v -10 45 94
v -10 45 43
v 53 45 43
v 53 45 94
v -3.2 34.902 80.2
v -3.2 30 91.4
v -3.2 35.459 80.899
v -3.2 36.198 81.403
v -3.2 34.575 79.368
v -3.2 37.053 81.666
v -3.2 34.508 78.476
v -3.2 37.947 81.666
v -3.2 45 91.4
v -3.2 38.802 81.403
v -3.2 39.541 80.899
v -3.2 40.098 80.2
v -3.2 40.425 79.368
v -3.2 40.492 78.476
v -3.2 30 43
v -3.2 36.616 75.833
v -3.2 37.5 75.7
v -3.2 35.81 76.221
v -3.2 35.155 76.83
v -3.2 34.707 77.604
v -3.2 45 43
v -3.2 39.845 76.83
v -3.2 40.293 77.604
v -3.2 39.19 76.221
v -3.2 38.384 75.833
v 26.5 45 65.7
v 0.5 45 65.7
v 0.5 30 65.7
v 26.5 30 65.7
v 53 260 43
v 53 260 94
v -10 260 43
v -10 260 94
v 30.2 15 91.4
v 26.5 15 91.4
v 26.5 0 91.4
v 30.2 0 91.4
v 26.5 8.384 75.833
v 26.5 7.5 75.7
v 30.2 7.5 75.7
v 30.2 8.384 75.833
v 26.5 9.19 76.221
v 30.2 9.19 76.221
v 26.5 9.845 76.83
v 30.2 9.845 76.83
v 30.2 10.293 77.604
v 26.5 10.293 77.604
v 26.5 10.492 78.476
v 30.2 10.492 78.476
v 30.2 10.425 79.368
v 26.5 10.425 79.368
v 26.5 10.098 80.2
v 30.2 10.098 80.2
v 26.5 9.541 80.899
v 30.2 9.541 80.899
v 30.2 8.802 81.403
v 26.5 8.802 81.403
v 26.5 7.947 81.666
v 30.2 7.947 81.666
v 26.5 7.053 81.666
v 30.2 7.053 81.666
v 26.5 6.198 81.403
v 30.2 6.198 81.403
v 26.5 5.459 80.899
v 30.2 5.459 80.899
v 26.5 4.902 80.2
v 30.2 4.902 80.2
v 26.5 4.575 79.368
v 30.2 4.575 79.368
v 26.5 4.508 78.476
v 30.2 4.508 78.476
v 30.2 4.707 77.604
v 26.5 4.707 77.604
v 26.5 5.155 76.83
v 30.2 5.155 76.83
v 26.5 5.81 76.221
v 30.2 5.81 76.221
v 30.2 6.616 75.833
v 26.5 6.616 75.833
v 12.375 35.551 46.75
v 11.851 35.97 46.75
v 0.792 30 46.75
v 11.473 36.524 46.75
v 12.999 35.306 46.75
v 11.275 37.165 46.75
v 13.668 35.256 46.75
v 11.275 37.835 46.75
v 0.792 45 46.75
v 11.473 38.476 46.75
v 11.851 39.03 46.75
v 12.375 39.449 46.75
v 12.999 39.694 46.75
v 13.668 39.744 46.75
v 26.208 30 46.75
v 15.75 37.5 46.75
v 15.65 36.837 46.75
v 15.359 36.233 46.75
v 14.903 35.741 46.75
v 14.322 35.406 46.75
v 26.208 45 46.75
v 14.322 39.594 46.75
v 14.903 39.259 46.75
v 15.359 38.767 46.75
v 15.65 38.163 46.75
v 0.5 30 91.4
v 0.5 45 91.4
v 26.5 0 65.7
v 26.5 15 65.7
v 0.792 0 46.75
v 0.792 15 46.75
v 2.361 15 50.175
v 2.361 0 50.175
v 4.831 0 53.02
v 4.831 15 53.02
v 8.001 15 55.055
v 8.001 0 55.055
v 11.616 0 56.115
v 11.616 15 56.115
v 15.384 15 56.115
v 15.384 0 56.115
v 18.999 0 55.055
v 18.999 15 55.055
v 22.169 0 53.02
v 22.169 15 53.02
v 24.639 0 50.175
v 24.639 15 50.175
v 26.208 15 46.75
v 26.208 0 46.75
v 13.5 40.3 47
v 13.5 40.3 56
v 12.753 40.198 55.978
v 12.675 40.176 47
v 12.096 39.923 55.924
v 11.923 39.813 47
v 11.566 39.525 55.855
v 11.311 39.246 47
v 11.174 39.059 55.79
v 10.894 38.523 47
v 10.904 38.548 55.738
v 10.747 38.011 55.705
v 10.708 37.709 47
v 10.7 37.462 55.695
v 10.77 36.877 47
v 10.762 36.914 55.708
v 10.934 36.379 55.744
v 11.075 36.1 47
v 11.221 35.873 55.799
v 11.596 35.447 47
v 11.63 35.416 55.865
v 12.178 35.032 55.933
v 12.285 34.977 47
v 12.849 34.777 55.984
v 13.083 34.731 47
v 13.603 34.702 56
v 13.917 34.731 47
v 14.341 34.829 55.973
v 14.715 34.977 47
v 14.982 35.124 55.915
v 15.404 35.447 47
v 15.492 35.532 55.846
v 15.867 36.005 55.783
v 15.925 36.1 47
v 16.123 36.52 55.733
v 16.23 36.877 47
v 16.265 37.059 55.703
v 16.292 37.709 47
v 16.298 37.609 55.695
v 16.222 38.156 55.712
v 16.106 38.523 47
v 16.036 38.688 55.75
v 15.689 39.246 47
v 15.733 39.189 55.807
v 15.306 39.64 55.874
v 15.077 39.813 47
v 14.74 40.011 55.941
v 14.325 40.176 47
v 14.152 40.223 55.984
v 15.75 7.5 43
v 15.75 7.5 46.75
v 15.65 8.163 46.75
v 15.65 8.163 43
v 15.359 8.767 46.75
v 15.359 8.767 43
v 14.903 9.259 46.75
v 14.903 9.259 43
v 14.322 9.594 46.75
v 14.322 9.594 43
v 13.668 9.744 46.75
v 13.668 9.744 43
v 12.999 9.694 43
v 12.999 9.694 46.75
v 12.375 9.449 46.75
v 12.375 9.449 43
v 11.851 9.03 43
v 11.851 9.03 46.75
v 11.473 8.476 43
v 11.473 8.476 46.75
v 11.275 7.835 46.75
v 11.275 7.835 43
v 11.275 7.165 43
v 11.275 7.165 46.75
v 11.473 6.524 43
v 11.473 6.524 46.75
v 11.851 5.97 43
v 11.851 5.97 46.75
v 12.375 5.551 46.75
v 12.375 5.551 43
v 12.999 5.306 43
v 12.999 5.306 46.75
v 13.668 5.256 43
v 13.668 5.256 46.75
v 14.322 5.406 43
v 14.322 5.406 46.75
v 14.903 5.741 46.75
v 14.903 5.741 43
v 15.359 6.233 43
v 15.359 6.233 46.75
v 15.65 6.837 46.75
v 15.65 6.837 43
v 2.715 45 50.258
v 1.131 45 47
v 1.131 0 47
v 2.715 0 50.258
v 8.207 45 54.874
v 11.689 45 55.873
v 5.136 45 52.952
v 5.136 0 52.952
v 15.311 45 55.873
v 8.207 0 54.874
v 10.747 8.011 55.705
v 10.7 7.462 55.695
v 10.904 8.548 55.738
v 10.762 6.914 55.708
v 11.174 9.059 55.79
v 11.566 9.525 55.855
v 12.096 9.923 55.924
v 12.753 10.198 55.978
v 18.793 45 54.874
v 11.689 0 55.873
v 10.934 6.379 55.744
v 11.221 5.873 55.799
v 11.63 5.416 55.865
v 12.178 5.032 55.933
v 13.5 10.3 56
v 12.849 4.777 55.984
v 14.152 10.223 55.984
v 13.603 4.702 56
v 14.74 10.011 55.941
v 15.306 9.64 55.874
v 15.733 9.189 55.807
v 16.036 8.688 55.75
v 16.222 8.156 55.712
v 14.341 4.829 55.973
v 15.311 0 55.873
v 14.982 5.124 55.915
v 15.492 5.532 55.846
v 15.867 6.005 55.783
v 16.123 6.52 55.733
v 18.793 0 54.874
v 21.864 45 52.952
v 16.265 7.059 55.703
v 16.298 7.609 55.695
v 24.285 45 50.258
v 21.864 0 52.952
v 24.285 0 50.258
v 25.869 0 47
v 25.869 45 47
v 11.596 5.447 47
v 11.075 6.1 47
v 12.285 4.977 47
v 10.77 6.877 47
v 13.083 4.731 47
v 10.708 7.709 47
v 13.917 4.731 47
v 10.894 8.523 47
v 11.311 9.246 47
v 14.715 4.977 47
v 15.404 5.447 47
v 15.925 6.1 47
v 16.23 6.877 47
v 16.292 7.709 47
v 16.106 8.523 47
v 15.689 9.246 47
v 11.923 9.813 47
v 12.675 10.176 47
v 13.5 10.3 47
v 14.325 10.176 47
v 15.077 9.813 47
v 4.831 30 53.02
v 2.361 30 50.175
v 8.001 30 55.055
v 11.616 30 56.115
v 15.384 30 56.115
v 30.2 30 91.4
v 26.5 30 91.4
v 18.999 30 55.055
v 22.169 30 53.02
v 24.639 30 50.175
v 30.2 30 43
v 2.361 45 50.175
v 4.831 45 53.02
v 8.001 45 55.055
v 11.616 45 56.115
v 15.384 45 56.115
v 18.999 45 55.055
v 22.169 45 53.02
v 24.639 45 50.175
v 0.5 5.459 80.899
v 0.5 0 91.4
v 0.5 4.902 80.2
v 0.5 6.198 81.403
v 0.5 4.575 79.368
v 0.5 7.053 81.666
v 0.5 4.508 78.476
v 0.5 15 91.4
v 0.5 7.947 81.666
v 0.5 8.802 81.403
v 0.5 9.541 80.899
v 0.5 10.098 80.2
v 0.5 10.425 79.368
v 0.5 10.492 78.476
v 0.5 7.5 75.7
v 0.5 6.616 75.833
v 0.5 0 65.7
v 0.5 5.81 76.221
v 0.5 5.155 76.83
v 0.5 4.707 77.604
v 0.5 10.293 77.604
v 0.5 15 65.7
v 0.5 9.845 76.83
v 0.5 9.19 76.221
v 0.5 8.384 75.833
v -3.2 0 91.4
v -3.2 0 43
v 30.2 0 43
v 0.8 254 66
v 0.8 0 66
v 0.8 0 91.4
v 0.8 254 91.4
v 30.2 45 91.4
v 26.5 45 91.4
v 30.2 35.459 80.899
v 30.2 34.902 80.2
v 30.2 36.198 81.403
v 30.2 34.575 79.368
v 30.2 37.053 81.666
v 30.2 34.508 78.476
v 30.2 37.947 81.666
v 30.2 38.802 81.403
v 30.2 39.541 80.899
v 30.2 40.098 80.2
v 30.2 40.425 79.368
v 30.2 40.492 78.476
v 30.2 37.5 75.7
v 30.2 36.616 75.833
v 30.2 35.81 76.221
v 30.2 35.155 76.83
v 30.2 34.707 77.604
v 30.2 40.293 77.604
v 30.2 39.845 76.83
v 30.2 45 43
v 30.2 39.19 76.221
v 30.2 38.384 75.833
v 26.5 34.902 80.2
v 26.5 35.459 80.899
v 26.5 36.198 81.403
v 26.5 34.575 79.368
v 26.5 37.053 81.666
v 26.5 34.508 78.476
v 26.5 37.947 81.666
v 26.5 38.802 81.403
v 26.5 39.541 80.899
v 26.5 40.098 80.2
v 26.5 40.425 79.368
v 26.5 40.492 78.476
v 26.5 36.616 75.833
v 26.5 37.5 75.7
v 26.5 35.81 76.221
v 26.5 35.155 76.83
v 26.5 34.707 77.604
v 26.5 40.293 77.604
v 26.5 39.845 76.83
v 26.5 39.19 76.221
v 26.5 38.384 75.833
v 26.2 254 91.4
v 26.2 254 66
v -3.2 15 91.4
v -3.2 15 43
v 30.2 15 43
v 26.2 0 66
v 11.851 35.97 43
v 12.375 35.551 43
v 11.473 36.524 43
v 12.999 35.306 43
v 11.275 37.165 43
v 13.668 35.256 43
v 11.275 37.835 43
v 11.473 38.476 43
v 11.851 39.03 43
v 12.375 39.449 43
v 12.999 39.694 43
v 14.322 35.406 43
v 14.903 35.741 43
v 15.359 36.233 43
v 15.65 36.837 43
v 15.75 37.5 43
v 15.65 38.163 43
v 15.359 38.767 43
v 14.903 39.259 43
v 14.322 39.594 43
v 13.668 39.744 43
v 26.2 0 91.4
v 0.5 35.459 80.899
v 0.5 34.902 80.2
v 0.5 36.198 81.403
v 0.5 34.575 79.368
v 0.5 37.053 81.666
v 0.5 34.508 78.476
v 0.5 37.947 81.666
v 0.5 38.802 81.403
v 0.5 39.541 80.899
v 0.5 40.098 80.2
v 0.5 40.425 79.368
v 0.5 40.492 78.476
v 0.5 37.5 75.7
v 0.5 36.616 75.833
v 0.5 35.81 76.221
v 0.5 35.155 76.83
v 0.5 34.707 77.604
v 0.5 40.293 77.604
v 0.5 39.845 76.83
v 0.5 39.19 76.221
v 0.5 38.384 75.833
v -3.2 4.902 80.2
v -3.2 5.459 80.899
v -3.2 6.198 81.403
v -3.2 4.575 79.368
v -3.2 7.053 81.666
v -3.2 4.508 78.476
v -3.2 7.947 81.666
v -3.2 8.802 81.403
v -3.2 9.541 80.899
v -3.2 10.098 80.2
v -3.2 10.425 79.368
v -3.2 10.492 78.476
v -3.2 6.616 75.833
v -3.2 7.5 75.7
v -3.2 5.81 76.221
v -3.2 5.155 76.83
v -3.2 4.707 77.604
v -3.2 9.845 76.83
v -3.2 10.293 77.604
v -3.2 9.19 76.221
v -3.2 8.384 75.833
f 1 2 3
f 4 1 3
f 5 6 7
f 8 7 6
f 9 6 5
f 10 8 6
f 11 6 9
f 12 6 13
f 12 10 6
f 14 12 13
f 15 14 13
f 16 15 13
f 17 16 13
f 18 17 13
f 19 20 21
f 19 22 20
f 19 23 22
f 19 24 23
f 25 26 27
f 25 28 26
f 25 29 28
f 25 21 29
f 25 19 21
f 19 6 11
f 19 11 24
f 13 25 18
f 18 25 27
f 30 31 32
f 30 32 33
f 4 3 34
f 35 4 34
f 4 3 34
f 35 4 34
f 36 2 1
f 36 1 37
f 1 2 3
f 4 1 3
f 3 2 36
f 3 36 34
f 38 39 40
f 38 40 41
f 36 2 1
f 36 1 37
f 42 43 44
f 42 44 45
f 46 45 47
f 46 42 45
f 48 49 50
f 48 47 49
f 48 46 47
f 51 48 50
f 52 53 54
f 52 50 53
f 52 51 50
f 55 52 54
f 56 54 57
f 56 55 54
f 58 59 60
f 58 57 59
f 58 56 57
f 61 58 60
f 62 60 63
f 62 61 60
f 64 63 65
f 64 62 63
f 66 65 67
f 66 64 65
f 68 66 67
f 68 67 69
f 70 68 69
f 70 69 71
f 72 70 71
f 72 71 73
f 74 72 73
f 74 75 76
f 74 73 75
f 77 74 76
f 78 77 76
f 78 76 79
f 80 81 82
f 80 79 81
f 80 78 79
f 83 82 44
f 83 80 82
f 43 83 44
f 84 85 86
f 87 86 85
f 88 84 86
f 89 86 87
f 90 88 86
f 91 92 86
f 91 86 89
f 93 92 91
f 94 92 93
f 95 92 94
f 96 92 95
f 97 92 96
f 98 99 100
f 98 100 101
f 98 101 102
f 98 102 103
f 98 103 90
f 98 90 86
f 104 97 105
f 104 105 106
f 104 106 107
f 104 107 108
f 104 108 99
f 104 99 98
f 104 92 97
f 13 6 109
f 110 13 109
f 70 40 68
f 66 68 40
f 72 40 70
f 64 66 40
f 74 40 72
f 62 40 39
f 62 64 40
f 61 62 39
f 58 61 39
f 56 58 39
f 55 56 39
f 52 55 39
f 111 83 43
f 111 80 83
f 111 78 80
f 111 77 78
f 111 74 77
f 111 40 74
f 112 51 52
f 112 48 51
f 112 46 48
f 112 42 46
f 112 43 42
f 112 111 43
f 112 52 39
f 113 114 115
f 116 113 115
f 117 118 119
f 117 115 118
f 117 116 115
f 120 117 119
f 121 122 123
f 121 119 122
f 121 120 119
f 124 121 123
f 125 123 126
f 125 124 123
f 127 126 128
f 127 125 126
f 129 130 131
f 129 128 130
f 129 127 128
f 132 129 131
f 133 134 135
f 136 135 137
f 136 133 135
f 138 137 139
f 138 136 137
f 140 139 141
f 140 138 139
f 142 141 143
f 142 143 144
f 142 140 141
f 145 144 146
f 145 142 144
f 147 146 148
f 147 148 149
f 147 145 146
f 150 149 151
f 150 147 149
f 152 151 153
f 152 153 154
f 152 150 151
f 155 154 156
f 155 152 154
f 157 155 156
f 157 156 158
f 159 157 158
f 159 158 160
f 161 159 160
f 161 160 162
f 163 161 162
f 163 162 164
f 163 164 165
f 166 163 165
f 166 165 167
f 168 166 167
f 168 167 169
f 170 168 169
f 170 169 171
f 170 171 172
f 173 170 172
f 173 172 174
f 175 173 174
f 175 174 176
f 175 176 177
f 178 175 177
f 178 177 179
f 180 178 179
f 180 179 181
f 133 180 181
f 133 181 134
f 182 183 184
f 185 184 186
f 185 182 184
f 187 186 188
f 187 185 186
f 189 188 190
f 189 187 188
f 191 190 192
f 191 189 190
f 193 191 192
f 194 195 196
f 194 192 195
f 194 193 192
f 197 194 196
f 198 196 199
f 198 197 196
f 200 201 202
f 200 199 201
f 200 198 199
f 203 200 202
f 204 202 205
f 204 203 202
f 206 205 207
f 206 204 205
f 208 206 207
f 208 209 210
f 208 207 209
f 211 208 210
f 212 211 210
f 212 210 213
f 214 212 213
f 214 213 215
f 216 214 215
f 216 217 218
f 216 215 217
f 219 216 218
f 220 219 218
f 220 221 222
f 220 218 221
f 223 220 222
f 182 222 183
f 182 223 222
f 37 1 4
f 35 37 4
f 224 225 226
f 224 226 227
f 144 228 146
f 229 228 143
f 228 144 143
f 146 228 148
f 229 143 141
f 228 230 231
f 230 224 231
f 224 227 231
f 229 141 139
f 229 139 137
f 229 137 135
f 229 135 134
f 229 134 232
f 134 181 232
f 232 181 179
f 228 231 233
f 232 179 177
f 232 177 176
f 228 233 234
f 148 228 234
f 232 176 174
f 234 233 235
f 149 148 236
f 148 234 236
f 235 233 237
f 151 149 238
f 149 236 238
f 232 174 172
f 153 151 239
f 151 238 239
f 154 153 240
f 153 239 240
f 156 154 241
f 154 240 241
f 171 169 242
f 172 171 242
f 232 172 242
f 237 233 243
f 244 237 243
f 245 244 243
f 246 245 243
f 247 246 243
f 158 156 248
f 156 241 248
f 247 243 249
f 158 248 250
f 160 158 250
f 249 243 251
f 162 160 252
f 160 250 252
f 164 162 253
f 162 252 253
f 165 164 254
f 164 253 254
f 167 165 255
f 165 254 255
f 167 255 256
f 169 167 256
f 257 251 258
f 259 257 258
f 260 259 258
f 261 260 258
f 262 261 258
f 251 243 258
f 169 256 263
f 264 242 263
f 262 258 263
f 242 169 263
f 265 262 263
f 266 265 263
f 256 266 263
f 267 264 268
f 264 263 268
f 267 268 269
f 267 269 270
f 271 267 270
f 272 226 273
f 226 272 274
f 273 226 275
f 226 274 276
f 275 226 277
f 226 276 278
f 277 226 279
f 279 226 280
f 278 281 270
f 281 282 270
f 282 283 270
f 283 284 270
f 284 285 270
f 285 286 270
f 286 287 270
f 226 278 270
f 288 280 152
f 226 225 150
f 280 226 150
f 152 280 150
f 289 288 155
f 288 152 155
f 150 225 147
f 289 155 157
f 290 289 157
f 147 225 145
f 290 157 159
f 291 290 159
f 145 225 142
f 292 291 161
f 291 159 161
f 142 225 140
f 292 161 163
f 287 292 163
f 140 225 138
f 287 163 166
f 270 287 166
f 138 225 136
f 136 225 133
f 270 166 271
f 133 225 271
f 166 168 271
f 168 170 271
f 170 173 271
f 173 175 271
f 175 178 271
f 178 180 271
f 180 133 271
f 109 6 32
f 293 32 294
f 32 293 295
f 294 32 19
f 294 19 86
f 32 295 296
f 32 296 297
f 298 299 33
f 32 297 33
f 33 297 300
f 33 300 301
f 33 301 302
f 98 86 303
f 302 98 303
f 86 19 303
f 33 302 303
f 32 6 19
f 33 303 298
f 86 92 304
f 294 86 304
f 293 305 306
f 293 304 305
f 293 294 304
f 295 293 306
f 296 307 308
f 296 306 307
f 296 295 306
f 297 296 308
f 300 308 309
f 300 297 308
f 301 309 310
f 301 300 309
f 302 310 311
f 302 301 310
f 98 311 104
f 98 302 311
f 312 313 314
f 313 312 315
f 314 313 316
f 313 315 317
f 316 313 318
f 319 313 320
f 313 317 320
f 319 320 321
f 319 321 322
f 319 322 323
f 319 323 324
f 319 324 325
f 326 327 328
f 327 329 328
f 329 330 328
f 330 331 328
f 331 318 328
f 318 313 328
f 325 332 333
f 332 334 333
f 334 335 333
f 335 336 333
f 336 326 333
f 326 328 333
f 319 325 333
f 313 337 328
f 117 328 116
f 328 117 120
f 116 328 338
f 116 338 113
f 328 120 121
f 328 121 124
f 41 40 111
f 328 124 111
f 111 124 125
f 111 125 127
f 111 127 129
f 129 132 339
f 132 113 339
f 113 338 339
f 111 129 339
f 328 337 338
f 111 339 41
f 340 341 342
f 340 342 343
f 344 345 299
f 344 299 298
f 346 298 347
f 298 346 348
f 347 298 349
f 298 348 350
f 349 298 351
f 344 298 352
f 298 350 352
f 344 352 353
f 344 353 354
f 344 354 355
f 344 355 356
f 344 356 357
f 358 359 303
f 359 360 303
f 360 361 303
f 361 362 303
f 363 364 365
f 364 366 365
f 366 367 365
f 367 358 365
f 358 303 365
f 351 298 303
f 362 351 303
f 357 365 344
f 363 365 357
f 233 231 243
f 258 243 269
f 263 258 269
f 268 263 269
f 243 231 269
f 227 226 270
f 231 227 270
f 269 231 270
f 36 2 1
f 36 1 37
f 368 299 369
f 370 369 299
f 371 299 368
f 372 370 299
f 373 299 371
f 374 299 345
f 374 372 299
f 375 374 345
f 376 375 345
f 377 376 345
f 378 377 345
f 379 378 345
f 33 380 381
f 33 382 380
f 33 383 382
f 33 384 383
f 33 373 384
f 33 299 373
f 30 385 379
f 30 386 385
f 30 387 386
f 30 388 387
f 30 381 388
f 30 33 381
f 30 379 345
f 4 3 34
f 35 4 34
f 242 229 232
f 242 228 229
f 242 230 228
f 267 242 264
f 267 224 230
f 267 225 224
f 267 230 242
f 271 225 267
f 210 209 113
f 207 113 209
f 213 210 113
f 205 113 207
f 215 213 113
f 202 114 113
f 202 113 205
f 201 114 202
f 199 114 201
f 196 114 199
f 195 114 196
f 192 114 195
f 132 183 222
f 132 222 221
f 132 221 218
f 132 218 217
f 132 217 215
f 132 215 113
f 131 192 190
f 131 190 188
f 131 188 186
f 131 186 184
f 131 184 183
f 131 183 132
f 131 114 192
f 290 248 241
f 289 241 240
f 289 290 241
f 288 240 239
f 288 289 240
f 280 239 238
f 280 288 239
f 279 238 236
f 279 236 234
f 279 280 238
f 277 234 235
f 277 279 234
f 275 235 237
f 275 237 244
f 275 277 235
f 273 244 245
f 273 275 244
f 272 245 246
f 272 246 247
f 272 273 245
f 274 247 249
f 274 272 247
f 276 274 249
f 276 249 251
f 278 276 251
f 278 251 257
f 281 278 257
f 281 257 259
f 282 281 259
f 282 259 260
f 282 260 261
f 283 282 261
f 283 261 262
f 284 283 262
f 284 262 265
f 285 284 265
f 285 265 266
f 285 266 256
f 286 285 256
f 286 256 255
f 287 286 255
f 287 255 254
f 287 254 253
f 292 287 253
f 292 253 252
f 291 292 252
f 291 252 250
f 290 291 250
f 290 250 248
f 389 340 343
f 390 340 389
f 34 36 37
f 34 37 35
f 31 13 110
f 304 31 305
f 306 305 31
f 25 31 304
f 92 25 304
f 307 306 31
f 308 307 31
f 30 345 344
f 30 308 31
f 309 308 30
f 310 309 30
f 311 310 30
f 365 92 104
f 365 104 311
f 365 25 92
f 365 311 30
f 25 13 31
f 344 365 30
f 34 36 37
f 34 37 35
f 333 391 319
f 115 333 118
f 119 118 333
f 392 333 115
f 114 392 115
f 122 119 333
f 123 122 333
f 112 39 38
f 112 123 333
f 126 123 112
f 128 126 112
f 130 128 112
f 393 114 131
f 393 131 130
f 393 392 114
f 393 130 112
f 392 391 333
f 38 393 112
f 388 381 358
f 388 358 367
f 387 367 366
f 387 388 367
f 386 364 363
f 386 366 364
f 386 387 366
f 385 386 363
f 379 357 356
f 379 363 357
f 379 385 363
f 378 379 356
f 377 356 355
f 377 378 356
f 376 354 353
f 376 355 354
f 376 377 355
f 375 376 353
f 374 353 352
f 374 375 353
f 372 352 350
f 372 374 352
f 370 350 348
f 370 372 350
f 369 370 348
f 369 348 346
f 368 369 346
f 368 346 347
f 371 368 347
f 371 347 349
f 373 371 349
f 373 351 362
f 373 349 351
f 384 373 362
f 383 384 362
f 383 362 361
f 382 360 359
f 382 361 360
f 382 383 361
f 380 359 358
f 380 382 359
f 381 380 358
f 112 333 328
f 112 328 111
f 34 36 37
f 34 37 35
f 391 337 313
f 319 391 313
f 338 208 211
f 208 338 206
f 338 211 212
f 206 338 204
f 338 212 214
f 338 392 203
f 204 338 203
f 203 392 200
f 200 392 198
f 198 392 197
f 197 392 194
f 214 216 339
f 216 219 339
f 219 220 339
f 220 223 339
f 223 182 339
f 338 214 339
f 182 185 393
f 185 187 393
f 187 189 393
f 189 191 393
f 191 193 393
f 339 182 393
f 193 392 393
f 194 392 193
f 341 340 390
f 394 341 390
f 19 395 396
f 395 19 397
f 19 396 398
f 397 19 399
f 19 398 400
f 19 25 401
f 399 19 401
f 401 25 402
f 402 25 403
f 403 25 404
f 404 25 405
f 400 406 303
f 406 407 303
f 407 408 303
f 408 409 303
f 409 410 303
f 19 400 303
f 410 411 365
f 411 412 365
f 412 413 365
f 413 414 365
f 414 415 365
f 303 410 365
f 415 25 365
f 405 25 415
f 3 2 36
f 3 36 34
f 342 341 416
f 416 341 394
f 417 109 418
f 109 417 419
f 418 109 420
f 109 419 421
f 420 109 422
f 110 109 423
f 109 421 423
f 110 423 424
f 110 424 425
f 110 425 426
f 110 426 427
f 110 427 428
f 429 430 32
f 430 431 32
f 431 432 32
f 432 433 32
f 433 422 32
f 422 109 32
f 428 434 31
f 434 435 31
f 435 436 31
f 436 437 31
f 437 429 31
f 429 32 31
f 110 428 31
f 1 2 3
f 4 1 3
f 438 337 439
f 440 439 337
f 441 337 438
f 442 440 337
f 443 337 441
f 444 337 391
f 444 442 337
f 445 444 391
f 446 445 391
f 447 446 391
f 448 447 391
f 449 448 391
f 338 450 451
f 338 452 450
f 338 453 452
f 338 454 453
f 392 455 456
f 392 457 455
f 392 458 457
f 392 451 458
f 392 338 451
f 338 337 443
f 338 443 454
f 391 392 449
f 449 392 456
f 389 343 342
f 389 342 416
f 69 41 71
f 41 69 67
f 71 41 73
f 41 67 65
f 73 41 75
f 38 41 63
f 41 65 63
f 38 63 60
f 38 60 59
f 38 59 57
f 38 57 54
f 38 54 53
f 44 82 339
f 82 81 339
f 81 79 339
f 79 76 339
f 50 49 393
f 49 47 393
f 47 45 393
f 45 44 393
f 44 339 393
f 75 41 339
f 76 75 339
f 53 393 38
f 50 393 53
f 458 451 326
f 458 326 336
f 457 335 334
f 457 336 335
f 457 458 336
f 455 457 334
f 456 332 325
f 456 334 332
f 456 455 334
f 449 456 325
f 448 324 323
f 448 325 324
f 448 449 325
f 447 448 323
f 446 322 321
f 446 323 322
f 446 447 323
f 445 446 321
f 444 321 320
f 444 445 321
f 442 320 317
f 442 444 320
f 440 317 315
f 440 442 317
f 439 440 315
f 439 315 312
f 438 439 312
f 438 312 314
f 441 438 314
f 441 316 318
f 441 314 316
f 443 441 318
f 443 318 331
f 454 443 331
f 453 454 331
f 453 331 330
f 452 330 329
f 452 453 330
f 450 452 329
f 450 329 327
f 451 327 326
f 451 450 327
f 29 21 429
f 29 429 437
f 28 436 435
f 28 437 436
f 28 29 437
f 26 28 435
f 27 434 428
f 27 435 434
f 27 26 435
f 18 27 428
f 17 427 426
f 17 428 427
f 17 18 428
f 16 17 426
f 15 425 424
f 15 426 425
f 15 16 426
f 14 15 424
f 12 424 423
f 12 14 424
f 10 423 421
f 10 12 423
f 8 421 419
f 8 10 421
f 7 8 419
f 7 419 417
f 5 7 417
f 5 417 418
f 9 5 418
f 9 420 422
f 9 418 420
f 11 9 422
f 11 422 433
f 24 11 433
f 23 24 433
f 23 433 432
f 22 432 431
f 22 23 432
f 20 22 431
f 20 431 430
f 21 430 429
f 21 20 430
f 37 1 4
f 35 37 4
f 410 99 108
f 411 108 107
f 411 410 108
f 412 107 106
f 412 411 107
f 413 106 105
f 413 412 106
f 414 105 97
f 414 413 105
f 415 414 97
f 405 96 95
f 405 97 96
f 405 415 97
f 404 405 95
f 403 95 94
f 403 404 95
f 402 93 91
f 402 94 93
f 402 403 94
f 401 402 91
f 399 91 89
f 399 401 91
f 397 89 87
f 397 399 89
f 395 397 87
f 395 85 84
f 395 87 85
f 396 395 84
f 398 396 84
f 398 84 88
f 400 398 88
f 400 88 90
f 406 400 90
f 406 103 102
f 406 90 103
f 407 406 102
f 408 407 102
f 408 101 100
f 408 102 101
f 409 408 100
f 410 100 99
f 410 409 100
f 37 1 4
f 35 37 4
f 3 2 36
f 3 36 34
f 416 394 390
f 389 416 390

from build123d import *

# Parameters (mm, degrees)
BOX013_W          = 25.4
BOX013_H          = 254
BOX013_DEPTH      = 25.4
BOX017_W          = 63
BOX017_H          = 215
BOX017_DEPTH      = 51
BOX021_W          = 63
BOX021_H          = 215
BOX021_DEPTH      = 51
BOX022_W          = 63
BOX022_H          = 215
BOX022_DEPTH      = 51
CYLINDER011_R     = 2.8
CYLINDER011_DEPTH = 10
CYLINDER012_R     = 2.8
CYLINDER012_DEPTH = 10
BOX020_W          = 63
BOX020_H          = 215
BOX020_DEPTH      = 51
BOX012_W          = 27
BOX012_H          = 200
BOX012_DEPTH      = 20
CYLINDER_R        = 13
CYLINDER_DEPTH    = 120
CYLINDER014_R     = 2.25
CYLINDER014_DEPTH = 10
CYLINDER008_R     = 3
CYLINDER008_DEPTH = 100
BOX023_W          = 27
BOX023_H          = 200
BOX023_DEPTH      = 20
CYLINDER013_R     = 13.25
CYLINDER013_DEPTH = 120
BOX_W             = 26
BOX_H             = 254
BOX_DEPTH         = 26
BOX014_W          = 33.4
BOX014_H          = 15
BOX014_DEPTH      = 48.4
CYLINDER015_R     = 2.25
CYLINDER015_DEPTH = 10
CYLINDER009_R     = 3
CYLINDER009_DEPTH = 100
BOX016_W          = 27
BOX016_H          = 200
BOX016_DEPTH      = 20
CYLINDER010_R     = 13.25
CYLINDER010_DEPTH = 120
BOX018_W          = 26
BOX018_H          = 254
BOX018_DEPTH      = 26
BOX015_W          = 33.4
BOX015_H          = 15
BOX015_DEPTH      = 48.4


with BuildPart() as tslotframe001:
    # Box013 → Box013 (new body)
    with BuildSketch(Plane(origin=(0.8, 0, 66), x_dir=(1, 0, 0), z_dir=(0, 0, 1))):
        with Locations((12.7, 127)):
            Rectangle(BOX013_W, BOX013_H)
    extrude(amount=BOX013_DEPTH)


with BuildPart() as shellcuts:
    # Box017 → Box017 (new body)
    with BuildSketch(Plane(origin=(-10, 45, 43), x_dir=(1, 0, 0), z_dir=(0, 0, 1))):
        with Locations((31.5, 107.5)):
            Rectangle(BOX017_W, BOX017_H)
    extrude(amount=BOX017_DEPTH)


with BuildPart() as shellcuts002:
    # Box021 → Box021 (new body)
    with BuildSketch(Plane(origin=(-10, 45, 43), x_dir=(1, 0, 0), z_dir=(0, 0, 1))):
        with Locations((31.5, 107.5)):
            Rectangle(BOX021_W, BOX021_H)
    extrude(amount=BOX021_DEPTH)


with BuildPart() as shellcuts003:
    # Box022 → Box022 (new body)
    with BuildSketch(Plane(origin=(-10, 45, 43), x_dir=(1, 0, 0), z_dir=(0, 0, 1))):
        with Locations((31.5, 107.5)):
            Rectangle(BOX022_W, BOX022_H)
    extrude(amount=BOX022_DEPTH)


with BuildPart() as cylinder011:
    # Cylinder011 → Cylinder011 (new body)
    with BuildSketch(Plane(origin=(13.5, 7.5, 47), x_dir=(0, 1, 0), z_dir=(0, 0, 1))):
        Circle(CYLINDER011_R)
    extrude(amount=CYLINDER011_DEPTH)


with BuildPart() as shellcuts004:
    # Cylinder012 → Cylinder012 (new body)
    with BuildSketch(Plane(origin=(13.5, 37.5, 47), x_dir=(0, 1, 0), z_dir=(0, 0, 1))):
        Circle(CYLINDER012_R)
    extrude(amount=CYLINDER012_DEPTH)

    # Fusion: union Cylinder011
    add(cylinder011.part)


with BuildPart() as shellcuts001:
    # Box020 → Box020 (new body)
    with BuildSketch(Plane(origin=(-10, 45, 43), x_dir=(1, 0, 0), z_dir=(0, 0, 1))):
        with Locations((31.5, 107.5)):
            Rectangle(BOX020_W, BOX020_H)
    extrude(amount=BOX020_DEPTH)


with BuildPart() as shell_holder001:
    # Box012 → Box012 (new body)
    with BuildSketch(Plane.XY.offset(27)):
        with Locations((13.5, 100)):
            Rectangle(BOX012_W, BOX012_H)
    extrude(amount=BOX012_DEPTH)


with BuildPart() as shell001:
    # Cylinder → Cylinder (new body)
    with BuildSketch(Plane(origin=(13.5, 15, 43), x_dir=(1, 0, 0), z_dir=(0, 1, 0))):
        Circle(CYLINDER_R)
    extrude(amount=CYLINDER_DEPTH)

    # Cut005: cut Shell_Holder001
    add(shell_holder001.part, mode=Mode.SUBTRACT)


with BuildPart() as shell001_1:
    # Cut005 placement: moved
    add(shell001.part.moved(Location((0, -15, 0))))

    # Cut: cut ShellCuts001
    add(shellcuts001.part, mode=Mode.SUBTRACT)

    # Cut007: cut ShellCuts004
    add(shellcuts004.part, mode=Mode.SUBTRACT)


with BuildPart() as cylinder014:
    # Cylinder014 → Cylinder014 (new body)
    with BuildSketch(Plane(origin=(13.5, 7.5, 43), x_dir=(1, 0, 0), z_dir=(0, 0, 1))):
        Circle(CYLINDER014_R)
    extrude(amount=CYLINDER014_DEPTH)


with BuildPart() as nailmimic002:
    # Cylinder008 → Cylinder008 (new body)
    with BuildSketch(Plane(origin=(-56.4, 7.5, 78.7), x_dir=(0, 0, -1), z_dir=(1, 0, 0))):
        Circle(CYLINDER008_R)
    extrude(amount=CYLINDER008_DEPTH)


with BuildPart() as shell_holder003:
    # Box023 → Box023 (new body)
    with BuildSketch(Plane.XY.offset(26.75)):
        with Locations((13.5, 100)):
            Rectangle(BOX023_W, BOX023_H)
    extrude(amount=BOX023_DEPTH)


with BuildPart() as shellcut001:
    # Cylinder013 → Cylinder013 (new body)
    with BuildSketch(Plane(origin=(13.5, 15, 43), x_dir=(1, 0, 0), z_dir=(0, 1, 0))):
        Circle(CYLINDER013_R)
    extrude(amount=CYLINDER013_DEPTH)

    # Cut010: cut Shell_Holder003
    add(shell_holder003.part, mode=Mode.SUBTRACT)


with BuildPart() as shellcut001_1:
    # Cut010 placement: moved
    add(shellcut001.part.moved(Location((0, -15, 0))))


with BuildPart() as tslotframecut:
    # Box → Box (new body)
    with BuildSketch(Plane(origin=(0.5, 0, 65.7), x_dir=(1, 0, 0), z_dir=(0, 0, 1))):
        with Locations((13, 127)):
            Rectangle(BOX_W, BOX_H)
    extrude(amount=BOX_DEPTH)


with BuildPart() as tslotmount008:
    # Box014 → Box014 (new body)
    with BuildSketch(Plane(origin=(-3.2, 0, 43), x_dir=(1, 0, 0), z_dir=(0, 0, 1))):
        with Locations((16.7, 7.5)):
            Rectangle(BOX014_W, BOX014_H)
    extrude(amount=BOX014_DEPTH)

    # Cut008: cut TSlotFrameCut
    add(tslotframecut.part, mode=Mode.SUBTRACT)

    # Cut012: cut ShellCut001
    add(shellcut001_1.part, mode=Mode.SUBTRACT)

    # Cut014: cut NailMimic002
    add(nailmimic002.part, mode=Mode.SUBTRACT)

    # Cut015: cut Cylinder014
    add(cylinder014.part, mode=Mode.SUBTRACT)


with BuildPart() as cylinder015:
    # Cylinder015 → Cylinder015 (new body)
    with BuildSketch(Plane(origin=(13.5, 37.5, 43), x_dir=(1, 0, 0), z_dir=(0, 0, 1))):
        Circle(CYLINDER015_R)
    extrude(amount=CYLINDER015_DEPTH)


with BuildPart() as nailmimic003:
    # Cylinder009 → Cylinder009 (new body)
    with BuildSketch(Plane(origin=(-56.4, 37.5, 78.7), x_dir=(0, 0, -1), z_dir=(1, 0, 0))):
        Circle(CYLINDER009_R)
    extrude(amount=CYLINDER009_DEPTH)


with BuildPart() as shell_holder002:
    # Box016 → Box016 (new body)
    with BuildSketch(Plane.XY.offset(26.75)):
        with Locations((13.5, 100)):
            Rectangle(BOX016_W, BOX016_H)
    extrude(amount=BOX016_DEPTH)


with BuildPart() as shellcut:
    # Cylinder010 → Cylinder010 (new body)
    with BuildSketch(Plane(origin=(13.5, 15, 43), x_dir=(1, 0, 0), z_dir=(0, 1, 0))):
        Circle(CYLINDER010_R)
    extrude(amount=CYLINDER010_DEPTH)

    # Cut006: cut Shell_Holder002
    add(shell_holder002.part, mode=Mode.SUBTRACT)


with BuildPart() as shellcut_1:
    # Cut006 placement: moved
    add(shellcut.part.moved(Location((0, -15, 0))))


with BuildPart() as tslotframecut001:
    # Box018 → Box018 (new body)
    with BuildSketch(Plane(origin=(0.5, 0, 65.7), x_dir=(1, 0, 0), z_dir=(0, 0, 1))):
        with Locations((13, 127)):
            Rectangle(BOX018_W, BOX018_H)
    extrude(amount=BOX018_DEPTH)


with BuildPart() as tslotmount009:
    # Box015 → Box015 (new body)
    with BuildSketch(Plane(origin=(-3.2, 30, 43), x_dir=(1, 0, 0), z_dir=(0, 0, 1))):
        with Locations((16.7, 7.5)):
            Rectangle(BOX015_W, BOX015_H)
    extrude(amount=BOX015_DEPTH)

    # Cut009: cut TSlotFrameCut001
    add(tslotframecut001.part, mode=Mode.SUBTRACT)

    # Cut011: cut ShellCut
    add(shellcut_1.part, mode=Mode.SUBTRACT)

    # Cut013: cut NailMimic003
    add(nailmimic003.part, mode=Mode.SUBTRACT)

    # Cut016: cut Cylinder015
    add(cylinder015.part, mode=Mode.SUBTRACT)


solid = Compound([tslotframe001.part, shellcuts.part, shellcuts002.part, shellcuts003.part, shell001_1.part, tslotmount008.part, tslotmount009.part])
